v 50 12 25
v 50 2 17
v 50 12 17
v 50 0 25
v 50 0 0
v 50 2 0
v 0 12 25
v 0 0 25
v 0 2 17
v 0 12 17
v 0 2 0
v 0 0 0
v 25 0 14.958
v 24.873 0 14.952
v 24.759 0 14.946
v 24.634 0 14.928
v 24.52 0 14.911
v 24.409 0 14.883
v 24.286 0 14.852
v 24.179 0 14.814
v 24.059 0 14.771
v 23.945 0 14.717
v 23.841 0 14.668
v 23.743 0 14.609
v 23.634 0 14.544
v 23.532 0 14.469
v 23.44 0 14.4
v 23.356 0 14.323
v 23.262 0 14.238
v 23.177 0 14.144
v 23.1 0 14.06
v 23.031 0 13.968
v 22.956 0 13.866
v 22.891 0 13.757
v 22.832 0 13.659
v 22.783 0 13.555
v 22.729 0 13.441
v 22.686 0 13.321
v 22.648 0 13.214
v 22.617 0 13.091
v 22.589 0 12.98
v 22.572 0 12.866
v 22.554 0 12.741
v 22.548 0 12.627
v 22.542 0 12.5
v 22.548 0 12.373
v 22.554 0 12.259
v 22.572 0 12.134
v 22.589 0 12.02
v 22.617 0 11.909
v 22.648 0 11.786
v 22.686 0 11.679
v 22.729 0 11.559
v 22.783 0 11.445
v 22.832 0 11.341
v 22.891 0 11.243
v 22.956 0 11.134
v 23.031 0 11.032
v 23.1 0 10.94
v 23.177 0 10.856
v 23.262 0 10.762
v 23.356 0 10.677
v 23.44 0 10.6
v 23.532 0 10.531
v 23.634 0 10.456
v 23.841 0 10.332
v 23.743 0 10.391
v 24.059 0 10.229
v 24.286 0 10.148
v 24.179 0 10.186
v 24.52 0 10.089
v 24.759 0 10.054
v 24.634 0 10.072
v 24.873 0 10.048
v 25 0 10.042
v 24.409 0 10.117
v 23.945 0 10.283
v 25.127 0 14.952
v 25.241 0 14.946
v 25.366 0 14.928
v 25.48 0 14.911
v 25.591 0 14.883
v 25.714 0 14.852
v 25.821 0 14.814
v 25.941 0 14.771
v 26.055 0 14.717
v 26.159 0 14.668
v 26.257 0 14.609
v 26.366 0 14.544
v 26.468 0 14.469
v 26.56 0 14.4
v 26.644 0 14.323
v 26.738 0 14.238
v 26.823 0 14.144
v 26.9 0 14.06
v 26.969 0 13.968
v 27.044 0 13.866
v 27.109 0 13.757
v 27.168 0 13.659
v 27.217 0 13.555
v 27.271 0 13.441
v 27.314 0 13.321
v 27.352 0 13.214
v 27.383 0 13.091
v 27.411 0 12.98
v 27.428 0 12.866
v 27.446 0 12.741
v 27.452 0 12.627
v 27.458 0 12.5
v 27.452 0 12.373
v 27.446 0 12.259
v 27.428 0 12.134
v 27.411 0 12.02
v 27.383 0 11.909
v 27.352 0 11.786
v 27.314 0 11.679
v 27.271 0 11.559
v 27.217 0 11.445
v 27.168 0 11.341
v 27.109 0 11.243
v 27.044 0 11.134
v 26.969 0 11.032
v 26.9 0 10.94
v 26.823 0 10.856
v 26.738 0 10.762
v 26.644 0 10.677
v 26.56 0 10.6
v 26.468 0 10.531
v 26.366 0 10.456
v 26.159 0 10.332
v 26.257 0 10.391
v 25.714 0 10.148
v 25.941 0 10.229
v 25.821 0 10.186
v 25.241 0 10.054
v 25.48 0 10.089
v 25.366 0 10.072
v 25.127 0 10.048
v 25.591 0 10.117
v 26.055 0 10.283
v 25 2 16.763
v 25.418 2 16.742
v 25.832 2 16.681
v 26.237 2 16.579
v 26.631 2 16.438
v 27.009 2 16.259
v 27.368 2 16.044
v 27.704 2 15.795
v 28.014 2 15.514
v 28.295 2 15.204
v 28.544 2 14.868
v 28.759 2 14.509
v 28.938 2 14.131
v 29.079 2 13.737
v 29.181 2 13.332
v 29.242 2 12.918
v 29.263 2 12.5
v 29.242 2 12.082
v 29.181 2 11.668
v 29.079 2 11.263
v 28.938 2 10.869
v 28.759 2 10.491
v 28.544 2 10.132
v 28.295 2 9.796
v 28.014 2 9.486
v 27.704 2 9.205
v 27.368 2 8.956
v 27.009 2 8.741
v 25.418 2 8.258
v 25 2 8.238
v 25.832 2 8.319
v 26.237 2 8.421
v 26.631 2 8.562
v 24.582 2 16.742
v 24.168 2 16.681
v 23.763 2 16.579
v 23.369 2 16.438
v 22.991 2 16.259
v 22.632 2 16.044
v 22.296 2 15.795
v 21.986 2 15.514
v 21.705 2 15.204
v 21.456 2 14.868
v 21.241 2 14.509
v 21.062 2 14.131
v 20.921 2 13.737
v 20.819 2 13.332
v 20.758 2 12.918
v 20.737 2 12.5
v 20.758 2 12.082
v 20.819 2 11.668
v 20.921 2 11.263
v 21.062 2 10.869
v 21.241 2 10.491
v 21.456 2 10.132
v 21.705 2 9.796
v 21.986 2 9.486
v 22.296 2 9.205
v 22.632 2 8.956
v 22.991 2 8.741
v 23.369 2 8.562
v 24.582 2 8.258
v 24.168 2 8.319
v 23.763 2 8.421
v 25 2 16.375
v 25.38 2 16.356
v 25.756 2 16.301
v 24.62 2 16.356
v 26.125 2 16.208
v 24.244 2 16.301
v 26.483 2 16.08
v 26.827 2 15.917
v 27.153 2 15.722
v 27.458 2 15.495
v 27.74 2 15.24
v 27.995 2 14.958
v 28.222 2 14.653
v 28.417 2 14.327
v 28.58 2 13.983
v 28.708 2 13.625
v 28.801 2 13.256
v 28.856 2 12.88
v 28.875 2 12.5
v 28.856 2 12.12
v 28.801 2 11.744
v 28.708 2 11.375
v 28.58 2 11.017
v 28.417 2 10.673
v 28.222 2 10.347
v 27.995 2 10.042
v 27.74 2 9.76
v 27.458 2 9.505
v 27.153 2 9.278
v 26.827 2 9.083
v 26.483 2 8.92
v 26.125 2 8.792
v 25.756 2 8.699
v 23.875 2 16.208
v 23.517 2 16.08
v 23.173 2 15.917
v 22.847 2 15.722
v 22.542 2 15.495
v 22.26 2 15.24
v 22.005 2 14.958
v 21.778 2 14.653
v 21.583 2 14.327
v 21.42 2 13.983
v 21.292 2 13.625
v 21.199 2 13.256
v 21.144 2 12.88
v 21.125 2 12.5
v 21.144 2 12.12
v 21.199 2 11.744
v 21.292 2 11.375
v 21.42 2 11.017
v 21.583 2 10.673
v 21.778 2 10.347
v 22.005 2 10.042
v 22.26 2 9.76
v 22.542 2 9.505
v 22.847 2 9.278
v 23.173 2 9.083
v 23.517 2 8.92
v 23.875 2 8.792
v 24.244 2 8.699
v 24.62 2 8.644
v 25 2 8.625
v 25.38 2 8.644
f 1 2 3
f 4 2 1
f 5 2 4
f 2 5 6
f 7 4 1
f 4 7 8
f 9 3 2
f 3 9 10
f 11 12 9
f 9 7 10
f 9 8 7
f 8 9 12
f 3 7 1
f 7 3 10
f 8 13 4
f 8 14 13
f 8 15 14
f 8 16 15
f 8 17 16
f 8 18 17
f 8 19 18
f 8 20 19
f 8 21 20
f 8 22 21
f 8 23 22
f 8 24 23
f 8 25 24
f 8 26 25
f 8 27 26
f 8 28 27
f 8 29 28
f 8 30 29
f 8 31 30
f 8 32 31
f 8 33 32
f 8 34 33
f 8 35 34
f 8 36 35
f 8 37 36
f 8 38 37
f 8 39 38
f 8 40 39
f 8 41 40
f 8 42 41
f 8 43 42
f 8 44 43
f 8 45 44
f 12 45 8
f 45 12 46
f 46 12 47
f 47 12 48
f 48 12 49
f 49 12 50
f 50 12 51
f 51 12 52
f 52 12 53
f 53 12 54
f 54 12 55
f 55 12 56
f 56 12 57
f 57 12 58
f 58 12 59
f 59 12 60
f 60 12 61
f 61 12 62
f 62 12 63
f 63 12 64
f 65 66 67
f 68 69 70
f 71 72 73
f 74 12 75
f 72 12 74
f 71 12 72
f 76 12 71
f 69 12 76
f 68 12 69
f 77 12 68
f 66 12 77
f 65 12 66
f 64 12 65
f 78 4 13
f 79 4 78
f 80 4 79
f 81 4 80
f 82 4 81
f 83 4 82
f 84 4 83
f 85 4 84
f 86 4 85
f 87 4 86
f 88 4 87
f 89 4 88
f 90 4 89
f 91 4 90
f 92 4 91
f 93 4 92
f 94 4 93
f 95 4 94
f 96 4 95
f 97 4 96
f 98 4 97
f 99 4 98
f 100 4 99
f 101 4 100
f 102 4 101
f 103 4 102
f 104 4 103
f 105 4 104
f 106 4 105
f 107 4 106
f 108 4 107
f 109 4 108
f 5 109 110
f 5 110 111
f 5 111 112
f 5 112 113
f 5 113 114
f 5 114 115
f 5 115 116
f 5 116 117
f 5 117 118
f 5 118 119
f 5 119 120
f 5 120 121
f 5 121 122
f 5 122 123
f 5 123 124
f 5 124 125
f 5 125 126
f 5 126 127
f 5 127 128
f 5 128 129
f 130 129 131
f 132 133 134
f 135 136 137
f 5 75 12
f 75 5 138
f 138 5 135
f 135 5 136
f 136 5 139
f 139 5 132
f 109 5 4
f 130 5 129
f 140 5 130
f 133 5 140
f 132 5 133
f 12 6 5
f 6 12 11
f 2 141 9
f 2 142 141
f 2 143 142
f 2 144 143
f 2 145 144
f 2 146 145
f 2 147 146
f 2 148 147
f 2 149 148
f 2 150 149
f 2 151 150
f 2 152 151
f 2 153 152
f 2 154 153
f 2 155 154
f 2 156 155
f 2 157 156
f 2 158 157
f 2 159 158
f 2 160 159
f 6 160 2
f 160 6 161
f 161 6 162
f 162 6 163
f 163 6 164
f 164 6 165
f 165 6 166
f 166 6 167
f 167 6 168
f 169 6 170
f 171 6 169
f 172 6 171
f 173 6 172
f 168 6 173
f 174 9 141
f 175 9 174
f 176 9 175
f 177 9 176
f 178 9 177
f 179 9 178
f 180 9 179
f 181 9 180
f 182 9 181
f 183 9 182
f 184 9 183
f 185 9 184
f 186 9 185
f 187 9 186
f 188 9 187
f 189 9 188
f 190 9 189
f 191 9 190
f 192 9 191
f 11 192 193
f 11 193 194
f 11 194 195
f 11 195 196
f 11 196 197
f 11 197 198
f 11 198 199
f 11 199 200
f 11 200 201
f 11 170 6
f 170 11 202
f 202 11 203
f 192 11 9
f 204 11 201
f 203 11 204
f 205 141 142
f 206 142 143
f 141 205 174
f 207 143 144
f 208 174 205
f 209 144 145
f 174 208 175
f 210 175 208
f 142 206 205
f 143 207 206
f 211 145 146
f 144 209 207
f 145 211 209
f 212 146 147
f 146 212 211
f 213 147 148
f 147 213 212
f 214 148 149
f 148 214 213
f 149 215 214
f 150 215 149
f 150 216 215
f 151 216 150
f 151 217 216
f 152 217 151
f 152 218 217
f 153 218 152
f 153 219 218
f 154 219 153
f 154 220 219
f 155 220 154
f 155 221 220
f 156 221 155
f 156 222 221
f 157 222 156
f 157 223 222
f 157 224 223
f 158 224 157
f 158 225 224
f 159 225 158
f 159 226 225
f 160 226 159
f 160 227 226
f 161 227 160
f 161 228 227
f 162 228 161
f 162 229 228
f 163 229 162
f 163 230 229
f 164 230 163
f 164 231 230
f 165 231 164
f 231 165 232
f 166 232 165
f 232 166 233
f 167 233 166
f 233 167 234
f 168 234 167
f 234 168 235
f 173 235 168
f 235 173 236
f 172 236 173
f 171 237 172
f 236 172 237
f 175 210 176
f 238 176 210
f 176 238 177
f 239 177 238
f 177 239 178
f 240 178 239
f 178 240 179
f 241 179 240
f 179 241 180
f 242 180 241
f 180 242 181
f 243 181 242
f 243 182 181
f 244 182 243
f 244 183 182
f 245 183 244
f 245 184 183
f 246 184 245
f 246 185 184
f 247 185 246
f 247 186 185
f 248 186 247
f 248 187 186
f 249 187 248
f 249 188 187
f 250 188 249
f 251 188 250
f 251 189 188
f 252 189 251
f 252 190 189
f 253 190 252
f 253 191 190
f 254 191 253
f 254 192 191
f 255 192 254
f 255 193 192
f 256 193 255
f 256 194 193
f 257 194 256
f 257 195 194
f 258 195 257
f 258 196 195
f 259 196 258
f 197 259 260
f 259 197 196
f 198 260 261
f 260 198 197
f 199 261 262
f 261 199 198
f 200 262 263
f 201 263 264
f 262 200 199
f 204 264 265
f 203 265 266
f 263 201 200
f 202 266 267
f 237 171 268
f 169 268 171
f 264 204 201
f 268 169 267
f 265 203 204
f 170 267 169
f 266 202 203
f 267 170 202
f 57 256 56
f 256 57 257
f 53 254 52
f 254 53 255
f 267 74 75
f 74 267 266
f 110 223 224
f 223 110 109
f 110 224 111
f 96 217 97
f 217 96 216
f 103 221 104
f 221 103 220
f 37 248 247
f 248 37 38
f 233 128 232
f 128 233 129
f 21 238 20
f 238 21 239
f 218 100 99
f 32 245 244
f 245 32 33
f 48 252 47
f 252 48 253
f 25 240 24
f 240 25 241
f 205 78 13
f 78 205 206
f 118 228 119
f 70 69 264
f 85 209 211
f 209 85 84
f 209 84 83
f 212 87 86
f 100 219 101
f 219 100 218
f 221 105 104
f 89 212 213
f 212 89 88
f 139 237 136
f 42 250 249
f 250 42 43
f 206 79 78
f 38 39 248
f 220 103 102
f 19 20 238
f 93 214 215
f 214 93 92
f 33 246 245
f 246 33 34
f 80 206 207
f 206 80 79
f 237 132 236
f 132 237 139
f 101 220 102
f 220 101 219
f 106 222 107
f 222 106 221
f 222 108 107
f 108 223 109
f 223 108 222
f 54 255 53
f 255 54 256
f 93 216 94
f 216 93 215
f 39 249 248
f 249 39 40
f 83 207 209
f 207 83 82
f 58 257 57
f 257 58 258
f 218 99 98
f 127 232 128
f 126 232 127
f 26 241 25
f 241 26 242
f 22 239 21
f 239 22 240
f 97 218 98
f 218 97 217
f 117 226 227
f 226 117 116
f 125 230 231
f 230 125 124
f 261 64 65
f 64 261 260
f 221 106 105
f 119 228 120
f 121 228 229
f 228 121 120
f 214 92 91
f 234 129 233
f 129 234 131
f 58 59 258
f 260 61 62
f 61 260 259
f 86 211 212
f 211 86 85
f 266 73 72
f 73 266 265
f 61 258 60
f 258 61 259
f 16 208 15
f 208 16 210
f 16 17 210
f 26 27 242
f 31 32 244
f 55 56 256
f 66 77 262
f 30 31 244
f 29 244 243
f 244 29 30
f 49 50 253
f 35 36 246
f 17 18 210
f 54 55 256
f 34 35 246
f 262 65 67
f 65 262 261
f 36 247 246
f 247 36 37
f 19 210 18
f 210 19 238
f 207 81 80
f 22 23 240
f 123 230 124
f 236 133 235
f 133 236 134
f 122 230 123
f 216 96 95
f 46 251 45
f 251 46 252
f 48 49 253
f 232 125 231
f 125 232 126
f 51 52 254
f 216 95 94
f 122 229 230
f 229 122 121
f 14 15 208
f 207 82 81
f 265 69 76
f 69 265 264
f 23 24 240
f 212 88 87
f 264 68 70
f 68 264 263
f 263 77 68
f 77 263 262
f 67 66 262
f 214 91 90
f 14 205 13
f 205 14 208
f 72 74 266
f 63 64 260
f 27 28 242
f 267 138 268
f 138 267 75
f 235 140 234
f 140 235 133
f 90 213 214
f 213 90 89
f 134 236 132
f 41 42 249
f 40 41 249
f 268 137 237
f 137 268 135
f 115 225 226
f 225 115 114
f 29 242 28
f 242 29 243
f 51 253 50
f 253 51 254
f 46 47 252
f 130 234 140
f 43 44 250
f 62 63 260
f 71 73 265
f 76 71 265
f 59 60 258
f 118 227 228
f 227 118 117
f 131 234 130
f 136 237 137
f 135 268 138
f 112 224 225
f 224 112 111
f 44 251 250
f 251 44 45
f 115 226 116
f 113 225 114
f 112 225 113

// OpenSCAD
$fn = 64;

spacer_dx = 50;
spacer_dy = 12;
spacer_dz = 8;

screw_d = 4;
screw_d1 = 3.5;
screw_d2 = 7.75;
screw_thread_l = 5;
screw_head_l = 3;
screw_l = screw_thread_l + screw_head_l;

module screw() {
  cylinder(d=screw_d, h=screw_l);
  translate([0, 0, screw_thread_l])
    cylinder(d1=screw_d1, d2=screw_d2, h=screw_head_l);
  // Add a cylinder for the head to clear the rest of the object, with some tolerance (10%).
  translate([0, 0, screw_l])
    cylinder(d=screw_d2 * 1.1, h=spacer_dy);
}

difference() {
  union() {
    translate([0, 0, 25 - spacer_dz]) {
      cube([spacer_dx, spacer_dy, spacer_dz]);
    }
    cube([spacer_dx, 2, 25]);
  }
  translate([spacer_dx / 2, 2 - screw_l, 25 / 2])
    rotate([-90, 0, 0])
      screw();
}
